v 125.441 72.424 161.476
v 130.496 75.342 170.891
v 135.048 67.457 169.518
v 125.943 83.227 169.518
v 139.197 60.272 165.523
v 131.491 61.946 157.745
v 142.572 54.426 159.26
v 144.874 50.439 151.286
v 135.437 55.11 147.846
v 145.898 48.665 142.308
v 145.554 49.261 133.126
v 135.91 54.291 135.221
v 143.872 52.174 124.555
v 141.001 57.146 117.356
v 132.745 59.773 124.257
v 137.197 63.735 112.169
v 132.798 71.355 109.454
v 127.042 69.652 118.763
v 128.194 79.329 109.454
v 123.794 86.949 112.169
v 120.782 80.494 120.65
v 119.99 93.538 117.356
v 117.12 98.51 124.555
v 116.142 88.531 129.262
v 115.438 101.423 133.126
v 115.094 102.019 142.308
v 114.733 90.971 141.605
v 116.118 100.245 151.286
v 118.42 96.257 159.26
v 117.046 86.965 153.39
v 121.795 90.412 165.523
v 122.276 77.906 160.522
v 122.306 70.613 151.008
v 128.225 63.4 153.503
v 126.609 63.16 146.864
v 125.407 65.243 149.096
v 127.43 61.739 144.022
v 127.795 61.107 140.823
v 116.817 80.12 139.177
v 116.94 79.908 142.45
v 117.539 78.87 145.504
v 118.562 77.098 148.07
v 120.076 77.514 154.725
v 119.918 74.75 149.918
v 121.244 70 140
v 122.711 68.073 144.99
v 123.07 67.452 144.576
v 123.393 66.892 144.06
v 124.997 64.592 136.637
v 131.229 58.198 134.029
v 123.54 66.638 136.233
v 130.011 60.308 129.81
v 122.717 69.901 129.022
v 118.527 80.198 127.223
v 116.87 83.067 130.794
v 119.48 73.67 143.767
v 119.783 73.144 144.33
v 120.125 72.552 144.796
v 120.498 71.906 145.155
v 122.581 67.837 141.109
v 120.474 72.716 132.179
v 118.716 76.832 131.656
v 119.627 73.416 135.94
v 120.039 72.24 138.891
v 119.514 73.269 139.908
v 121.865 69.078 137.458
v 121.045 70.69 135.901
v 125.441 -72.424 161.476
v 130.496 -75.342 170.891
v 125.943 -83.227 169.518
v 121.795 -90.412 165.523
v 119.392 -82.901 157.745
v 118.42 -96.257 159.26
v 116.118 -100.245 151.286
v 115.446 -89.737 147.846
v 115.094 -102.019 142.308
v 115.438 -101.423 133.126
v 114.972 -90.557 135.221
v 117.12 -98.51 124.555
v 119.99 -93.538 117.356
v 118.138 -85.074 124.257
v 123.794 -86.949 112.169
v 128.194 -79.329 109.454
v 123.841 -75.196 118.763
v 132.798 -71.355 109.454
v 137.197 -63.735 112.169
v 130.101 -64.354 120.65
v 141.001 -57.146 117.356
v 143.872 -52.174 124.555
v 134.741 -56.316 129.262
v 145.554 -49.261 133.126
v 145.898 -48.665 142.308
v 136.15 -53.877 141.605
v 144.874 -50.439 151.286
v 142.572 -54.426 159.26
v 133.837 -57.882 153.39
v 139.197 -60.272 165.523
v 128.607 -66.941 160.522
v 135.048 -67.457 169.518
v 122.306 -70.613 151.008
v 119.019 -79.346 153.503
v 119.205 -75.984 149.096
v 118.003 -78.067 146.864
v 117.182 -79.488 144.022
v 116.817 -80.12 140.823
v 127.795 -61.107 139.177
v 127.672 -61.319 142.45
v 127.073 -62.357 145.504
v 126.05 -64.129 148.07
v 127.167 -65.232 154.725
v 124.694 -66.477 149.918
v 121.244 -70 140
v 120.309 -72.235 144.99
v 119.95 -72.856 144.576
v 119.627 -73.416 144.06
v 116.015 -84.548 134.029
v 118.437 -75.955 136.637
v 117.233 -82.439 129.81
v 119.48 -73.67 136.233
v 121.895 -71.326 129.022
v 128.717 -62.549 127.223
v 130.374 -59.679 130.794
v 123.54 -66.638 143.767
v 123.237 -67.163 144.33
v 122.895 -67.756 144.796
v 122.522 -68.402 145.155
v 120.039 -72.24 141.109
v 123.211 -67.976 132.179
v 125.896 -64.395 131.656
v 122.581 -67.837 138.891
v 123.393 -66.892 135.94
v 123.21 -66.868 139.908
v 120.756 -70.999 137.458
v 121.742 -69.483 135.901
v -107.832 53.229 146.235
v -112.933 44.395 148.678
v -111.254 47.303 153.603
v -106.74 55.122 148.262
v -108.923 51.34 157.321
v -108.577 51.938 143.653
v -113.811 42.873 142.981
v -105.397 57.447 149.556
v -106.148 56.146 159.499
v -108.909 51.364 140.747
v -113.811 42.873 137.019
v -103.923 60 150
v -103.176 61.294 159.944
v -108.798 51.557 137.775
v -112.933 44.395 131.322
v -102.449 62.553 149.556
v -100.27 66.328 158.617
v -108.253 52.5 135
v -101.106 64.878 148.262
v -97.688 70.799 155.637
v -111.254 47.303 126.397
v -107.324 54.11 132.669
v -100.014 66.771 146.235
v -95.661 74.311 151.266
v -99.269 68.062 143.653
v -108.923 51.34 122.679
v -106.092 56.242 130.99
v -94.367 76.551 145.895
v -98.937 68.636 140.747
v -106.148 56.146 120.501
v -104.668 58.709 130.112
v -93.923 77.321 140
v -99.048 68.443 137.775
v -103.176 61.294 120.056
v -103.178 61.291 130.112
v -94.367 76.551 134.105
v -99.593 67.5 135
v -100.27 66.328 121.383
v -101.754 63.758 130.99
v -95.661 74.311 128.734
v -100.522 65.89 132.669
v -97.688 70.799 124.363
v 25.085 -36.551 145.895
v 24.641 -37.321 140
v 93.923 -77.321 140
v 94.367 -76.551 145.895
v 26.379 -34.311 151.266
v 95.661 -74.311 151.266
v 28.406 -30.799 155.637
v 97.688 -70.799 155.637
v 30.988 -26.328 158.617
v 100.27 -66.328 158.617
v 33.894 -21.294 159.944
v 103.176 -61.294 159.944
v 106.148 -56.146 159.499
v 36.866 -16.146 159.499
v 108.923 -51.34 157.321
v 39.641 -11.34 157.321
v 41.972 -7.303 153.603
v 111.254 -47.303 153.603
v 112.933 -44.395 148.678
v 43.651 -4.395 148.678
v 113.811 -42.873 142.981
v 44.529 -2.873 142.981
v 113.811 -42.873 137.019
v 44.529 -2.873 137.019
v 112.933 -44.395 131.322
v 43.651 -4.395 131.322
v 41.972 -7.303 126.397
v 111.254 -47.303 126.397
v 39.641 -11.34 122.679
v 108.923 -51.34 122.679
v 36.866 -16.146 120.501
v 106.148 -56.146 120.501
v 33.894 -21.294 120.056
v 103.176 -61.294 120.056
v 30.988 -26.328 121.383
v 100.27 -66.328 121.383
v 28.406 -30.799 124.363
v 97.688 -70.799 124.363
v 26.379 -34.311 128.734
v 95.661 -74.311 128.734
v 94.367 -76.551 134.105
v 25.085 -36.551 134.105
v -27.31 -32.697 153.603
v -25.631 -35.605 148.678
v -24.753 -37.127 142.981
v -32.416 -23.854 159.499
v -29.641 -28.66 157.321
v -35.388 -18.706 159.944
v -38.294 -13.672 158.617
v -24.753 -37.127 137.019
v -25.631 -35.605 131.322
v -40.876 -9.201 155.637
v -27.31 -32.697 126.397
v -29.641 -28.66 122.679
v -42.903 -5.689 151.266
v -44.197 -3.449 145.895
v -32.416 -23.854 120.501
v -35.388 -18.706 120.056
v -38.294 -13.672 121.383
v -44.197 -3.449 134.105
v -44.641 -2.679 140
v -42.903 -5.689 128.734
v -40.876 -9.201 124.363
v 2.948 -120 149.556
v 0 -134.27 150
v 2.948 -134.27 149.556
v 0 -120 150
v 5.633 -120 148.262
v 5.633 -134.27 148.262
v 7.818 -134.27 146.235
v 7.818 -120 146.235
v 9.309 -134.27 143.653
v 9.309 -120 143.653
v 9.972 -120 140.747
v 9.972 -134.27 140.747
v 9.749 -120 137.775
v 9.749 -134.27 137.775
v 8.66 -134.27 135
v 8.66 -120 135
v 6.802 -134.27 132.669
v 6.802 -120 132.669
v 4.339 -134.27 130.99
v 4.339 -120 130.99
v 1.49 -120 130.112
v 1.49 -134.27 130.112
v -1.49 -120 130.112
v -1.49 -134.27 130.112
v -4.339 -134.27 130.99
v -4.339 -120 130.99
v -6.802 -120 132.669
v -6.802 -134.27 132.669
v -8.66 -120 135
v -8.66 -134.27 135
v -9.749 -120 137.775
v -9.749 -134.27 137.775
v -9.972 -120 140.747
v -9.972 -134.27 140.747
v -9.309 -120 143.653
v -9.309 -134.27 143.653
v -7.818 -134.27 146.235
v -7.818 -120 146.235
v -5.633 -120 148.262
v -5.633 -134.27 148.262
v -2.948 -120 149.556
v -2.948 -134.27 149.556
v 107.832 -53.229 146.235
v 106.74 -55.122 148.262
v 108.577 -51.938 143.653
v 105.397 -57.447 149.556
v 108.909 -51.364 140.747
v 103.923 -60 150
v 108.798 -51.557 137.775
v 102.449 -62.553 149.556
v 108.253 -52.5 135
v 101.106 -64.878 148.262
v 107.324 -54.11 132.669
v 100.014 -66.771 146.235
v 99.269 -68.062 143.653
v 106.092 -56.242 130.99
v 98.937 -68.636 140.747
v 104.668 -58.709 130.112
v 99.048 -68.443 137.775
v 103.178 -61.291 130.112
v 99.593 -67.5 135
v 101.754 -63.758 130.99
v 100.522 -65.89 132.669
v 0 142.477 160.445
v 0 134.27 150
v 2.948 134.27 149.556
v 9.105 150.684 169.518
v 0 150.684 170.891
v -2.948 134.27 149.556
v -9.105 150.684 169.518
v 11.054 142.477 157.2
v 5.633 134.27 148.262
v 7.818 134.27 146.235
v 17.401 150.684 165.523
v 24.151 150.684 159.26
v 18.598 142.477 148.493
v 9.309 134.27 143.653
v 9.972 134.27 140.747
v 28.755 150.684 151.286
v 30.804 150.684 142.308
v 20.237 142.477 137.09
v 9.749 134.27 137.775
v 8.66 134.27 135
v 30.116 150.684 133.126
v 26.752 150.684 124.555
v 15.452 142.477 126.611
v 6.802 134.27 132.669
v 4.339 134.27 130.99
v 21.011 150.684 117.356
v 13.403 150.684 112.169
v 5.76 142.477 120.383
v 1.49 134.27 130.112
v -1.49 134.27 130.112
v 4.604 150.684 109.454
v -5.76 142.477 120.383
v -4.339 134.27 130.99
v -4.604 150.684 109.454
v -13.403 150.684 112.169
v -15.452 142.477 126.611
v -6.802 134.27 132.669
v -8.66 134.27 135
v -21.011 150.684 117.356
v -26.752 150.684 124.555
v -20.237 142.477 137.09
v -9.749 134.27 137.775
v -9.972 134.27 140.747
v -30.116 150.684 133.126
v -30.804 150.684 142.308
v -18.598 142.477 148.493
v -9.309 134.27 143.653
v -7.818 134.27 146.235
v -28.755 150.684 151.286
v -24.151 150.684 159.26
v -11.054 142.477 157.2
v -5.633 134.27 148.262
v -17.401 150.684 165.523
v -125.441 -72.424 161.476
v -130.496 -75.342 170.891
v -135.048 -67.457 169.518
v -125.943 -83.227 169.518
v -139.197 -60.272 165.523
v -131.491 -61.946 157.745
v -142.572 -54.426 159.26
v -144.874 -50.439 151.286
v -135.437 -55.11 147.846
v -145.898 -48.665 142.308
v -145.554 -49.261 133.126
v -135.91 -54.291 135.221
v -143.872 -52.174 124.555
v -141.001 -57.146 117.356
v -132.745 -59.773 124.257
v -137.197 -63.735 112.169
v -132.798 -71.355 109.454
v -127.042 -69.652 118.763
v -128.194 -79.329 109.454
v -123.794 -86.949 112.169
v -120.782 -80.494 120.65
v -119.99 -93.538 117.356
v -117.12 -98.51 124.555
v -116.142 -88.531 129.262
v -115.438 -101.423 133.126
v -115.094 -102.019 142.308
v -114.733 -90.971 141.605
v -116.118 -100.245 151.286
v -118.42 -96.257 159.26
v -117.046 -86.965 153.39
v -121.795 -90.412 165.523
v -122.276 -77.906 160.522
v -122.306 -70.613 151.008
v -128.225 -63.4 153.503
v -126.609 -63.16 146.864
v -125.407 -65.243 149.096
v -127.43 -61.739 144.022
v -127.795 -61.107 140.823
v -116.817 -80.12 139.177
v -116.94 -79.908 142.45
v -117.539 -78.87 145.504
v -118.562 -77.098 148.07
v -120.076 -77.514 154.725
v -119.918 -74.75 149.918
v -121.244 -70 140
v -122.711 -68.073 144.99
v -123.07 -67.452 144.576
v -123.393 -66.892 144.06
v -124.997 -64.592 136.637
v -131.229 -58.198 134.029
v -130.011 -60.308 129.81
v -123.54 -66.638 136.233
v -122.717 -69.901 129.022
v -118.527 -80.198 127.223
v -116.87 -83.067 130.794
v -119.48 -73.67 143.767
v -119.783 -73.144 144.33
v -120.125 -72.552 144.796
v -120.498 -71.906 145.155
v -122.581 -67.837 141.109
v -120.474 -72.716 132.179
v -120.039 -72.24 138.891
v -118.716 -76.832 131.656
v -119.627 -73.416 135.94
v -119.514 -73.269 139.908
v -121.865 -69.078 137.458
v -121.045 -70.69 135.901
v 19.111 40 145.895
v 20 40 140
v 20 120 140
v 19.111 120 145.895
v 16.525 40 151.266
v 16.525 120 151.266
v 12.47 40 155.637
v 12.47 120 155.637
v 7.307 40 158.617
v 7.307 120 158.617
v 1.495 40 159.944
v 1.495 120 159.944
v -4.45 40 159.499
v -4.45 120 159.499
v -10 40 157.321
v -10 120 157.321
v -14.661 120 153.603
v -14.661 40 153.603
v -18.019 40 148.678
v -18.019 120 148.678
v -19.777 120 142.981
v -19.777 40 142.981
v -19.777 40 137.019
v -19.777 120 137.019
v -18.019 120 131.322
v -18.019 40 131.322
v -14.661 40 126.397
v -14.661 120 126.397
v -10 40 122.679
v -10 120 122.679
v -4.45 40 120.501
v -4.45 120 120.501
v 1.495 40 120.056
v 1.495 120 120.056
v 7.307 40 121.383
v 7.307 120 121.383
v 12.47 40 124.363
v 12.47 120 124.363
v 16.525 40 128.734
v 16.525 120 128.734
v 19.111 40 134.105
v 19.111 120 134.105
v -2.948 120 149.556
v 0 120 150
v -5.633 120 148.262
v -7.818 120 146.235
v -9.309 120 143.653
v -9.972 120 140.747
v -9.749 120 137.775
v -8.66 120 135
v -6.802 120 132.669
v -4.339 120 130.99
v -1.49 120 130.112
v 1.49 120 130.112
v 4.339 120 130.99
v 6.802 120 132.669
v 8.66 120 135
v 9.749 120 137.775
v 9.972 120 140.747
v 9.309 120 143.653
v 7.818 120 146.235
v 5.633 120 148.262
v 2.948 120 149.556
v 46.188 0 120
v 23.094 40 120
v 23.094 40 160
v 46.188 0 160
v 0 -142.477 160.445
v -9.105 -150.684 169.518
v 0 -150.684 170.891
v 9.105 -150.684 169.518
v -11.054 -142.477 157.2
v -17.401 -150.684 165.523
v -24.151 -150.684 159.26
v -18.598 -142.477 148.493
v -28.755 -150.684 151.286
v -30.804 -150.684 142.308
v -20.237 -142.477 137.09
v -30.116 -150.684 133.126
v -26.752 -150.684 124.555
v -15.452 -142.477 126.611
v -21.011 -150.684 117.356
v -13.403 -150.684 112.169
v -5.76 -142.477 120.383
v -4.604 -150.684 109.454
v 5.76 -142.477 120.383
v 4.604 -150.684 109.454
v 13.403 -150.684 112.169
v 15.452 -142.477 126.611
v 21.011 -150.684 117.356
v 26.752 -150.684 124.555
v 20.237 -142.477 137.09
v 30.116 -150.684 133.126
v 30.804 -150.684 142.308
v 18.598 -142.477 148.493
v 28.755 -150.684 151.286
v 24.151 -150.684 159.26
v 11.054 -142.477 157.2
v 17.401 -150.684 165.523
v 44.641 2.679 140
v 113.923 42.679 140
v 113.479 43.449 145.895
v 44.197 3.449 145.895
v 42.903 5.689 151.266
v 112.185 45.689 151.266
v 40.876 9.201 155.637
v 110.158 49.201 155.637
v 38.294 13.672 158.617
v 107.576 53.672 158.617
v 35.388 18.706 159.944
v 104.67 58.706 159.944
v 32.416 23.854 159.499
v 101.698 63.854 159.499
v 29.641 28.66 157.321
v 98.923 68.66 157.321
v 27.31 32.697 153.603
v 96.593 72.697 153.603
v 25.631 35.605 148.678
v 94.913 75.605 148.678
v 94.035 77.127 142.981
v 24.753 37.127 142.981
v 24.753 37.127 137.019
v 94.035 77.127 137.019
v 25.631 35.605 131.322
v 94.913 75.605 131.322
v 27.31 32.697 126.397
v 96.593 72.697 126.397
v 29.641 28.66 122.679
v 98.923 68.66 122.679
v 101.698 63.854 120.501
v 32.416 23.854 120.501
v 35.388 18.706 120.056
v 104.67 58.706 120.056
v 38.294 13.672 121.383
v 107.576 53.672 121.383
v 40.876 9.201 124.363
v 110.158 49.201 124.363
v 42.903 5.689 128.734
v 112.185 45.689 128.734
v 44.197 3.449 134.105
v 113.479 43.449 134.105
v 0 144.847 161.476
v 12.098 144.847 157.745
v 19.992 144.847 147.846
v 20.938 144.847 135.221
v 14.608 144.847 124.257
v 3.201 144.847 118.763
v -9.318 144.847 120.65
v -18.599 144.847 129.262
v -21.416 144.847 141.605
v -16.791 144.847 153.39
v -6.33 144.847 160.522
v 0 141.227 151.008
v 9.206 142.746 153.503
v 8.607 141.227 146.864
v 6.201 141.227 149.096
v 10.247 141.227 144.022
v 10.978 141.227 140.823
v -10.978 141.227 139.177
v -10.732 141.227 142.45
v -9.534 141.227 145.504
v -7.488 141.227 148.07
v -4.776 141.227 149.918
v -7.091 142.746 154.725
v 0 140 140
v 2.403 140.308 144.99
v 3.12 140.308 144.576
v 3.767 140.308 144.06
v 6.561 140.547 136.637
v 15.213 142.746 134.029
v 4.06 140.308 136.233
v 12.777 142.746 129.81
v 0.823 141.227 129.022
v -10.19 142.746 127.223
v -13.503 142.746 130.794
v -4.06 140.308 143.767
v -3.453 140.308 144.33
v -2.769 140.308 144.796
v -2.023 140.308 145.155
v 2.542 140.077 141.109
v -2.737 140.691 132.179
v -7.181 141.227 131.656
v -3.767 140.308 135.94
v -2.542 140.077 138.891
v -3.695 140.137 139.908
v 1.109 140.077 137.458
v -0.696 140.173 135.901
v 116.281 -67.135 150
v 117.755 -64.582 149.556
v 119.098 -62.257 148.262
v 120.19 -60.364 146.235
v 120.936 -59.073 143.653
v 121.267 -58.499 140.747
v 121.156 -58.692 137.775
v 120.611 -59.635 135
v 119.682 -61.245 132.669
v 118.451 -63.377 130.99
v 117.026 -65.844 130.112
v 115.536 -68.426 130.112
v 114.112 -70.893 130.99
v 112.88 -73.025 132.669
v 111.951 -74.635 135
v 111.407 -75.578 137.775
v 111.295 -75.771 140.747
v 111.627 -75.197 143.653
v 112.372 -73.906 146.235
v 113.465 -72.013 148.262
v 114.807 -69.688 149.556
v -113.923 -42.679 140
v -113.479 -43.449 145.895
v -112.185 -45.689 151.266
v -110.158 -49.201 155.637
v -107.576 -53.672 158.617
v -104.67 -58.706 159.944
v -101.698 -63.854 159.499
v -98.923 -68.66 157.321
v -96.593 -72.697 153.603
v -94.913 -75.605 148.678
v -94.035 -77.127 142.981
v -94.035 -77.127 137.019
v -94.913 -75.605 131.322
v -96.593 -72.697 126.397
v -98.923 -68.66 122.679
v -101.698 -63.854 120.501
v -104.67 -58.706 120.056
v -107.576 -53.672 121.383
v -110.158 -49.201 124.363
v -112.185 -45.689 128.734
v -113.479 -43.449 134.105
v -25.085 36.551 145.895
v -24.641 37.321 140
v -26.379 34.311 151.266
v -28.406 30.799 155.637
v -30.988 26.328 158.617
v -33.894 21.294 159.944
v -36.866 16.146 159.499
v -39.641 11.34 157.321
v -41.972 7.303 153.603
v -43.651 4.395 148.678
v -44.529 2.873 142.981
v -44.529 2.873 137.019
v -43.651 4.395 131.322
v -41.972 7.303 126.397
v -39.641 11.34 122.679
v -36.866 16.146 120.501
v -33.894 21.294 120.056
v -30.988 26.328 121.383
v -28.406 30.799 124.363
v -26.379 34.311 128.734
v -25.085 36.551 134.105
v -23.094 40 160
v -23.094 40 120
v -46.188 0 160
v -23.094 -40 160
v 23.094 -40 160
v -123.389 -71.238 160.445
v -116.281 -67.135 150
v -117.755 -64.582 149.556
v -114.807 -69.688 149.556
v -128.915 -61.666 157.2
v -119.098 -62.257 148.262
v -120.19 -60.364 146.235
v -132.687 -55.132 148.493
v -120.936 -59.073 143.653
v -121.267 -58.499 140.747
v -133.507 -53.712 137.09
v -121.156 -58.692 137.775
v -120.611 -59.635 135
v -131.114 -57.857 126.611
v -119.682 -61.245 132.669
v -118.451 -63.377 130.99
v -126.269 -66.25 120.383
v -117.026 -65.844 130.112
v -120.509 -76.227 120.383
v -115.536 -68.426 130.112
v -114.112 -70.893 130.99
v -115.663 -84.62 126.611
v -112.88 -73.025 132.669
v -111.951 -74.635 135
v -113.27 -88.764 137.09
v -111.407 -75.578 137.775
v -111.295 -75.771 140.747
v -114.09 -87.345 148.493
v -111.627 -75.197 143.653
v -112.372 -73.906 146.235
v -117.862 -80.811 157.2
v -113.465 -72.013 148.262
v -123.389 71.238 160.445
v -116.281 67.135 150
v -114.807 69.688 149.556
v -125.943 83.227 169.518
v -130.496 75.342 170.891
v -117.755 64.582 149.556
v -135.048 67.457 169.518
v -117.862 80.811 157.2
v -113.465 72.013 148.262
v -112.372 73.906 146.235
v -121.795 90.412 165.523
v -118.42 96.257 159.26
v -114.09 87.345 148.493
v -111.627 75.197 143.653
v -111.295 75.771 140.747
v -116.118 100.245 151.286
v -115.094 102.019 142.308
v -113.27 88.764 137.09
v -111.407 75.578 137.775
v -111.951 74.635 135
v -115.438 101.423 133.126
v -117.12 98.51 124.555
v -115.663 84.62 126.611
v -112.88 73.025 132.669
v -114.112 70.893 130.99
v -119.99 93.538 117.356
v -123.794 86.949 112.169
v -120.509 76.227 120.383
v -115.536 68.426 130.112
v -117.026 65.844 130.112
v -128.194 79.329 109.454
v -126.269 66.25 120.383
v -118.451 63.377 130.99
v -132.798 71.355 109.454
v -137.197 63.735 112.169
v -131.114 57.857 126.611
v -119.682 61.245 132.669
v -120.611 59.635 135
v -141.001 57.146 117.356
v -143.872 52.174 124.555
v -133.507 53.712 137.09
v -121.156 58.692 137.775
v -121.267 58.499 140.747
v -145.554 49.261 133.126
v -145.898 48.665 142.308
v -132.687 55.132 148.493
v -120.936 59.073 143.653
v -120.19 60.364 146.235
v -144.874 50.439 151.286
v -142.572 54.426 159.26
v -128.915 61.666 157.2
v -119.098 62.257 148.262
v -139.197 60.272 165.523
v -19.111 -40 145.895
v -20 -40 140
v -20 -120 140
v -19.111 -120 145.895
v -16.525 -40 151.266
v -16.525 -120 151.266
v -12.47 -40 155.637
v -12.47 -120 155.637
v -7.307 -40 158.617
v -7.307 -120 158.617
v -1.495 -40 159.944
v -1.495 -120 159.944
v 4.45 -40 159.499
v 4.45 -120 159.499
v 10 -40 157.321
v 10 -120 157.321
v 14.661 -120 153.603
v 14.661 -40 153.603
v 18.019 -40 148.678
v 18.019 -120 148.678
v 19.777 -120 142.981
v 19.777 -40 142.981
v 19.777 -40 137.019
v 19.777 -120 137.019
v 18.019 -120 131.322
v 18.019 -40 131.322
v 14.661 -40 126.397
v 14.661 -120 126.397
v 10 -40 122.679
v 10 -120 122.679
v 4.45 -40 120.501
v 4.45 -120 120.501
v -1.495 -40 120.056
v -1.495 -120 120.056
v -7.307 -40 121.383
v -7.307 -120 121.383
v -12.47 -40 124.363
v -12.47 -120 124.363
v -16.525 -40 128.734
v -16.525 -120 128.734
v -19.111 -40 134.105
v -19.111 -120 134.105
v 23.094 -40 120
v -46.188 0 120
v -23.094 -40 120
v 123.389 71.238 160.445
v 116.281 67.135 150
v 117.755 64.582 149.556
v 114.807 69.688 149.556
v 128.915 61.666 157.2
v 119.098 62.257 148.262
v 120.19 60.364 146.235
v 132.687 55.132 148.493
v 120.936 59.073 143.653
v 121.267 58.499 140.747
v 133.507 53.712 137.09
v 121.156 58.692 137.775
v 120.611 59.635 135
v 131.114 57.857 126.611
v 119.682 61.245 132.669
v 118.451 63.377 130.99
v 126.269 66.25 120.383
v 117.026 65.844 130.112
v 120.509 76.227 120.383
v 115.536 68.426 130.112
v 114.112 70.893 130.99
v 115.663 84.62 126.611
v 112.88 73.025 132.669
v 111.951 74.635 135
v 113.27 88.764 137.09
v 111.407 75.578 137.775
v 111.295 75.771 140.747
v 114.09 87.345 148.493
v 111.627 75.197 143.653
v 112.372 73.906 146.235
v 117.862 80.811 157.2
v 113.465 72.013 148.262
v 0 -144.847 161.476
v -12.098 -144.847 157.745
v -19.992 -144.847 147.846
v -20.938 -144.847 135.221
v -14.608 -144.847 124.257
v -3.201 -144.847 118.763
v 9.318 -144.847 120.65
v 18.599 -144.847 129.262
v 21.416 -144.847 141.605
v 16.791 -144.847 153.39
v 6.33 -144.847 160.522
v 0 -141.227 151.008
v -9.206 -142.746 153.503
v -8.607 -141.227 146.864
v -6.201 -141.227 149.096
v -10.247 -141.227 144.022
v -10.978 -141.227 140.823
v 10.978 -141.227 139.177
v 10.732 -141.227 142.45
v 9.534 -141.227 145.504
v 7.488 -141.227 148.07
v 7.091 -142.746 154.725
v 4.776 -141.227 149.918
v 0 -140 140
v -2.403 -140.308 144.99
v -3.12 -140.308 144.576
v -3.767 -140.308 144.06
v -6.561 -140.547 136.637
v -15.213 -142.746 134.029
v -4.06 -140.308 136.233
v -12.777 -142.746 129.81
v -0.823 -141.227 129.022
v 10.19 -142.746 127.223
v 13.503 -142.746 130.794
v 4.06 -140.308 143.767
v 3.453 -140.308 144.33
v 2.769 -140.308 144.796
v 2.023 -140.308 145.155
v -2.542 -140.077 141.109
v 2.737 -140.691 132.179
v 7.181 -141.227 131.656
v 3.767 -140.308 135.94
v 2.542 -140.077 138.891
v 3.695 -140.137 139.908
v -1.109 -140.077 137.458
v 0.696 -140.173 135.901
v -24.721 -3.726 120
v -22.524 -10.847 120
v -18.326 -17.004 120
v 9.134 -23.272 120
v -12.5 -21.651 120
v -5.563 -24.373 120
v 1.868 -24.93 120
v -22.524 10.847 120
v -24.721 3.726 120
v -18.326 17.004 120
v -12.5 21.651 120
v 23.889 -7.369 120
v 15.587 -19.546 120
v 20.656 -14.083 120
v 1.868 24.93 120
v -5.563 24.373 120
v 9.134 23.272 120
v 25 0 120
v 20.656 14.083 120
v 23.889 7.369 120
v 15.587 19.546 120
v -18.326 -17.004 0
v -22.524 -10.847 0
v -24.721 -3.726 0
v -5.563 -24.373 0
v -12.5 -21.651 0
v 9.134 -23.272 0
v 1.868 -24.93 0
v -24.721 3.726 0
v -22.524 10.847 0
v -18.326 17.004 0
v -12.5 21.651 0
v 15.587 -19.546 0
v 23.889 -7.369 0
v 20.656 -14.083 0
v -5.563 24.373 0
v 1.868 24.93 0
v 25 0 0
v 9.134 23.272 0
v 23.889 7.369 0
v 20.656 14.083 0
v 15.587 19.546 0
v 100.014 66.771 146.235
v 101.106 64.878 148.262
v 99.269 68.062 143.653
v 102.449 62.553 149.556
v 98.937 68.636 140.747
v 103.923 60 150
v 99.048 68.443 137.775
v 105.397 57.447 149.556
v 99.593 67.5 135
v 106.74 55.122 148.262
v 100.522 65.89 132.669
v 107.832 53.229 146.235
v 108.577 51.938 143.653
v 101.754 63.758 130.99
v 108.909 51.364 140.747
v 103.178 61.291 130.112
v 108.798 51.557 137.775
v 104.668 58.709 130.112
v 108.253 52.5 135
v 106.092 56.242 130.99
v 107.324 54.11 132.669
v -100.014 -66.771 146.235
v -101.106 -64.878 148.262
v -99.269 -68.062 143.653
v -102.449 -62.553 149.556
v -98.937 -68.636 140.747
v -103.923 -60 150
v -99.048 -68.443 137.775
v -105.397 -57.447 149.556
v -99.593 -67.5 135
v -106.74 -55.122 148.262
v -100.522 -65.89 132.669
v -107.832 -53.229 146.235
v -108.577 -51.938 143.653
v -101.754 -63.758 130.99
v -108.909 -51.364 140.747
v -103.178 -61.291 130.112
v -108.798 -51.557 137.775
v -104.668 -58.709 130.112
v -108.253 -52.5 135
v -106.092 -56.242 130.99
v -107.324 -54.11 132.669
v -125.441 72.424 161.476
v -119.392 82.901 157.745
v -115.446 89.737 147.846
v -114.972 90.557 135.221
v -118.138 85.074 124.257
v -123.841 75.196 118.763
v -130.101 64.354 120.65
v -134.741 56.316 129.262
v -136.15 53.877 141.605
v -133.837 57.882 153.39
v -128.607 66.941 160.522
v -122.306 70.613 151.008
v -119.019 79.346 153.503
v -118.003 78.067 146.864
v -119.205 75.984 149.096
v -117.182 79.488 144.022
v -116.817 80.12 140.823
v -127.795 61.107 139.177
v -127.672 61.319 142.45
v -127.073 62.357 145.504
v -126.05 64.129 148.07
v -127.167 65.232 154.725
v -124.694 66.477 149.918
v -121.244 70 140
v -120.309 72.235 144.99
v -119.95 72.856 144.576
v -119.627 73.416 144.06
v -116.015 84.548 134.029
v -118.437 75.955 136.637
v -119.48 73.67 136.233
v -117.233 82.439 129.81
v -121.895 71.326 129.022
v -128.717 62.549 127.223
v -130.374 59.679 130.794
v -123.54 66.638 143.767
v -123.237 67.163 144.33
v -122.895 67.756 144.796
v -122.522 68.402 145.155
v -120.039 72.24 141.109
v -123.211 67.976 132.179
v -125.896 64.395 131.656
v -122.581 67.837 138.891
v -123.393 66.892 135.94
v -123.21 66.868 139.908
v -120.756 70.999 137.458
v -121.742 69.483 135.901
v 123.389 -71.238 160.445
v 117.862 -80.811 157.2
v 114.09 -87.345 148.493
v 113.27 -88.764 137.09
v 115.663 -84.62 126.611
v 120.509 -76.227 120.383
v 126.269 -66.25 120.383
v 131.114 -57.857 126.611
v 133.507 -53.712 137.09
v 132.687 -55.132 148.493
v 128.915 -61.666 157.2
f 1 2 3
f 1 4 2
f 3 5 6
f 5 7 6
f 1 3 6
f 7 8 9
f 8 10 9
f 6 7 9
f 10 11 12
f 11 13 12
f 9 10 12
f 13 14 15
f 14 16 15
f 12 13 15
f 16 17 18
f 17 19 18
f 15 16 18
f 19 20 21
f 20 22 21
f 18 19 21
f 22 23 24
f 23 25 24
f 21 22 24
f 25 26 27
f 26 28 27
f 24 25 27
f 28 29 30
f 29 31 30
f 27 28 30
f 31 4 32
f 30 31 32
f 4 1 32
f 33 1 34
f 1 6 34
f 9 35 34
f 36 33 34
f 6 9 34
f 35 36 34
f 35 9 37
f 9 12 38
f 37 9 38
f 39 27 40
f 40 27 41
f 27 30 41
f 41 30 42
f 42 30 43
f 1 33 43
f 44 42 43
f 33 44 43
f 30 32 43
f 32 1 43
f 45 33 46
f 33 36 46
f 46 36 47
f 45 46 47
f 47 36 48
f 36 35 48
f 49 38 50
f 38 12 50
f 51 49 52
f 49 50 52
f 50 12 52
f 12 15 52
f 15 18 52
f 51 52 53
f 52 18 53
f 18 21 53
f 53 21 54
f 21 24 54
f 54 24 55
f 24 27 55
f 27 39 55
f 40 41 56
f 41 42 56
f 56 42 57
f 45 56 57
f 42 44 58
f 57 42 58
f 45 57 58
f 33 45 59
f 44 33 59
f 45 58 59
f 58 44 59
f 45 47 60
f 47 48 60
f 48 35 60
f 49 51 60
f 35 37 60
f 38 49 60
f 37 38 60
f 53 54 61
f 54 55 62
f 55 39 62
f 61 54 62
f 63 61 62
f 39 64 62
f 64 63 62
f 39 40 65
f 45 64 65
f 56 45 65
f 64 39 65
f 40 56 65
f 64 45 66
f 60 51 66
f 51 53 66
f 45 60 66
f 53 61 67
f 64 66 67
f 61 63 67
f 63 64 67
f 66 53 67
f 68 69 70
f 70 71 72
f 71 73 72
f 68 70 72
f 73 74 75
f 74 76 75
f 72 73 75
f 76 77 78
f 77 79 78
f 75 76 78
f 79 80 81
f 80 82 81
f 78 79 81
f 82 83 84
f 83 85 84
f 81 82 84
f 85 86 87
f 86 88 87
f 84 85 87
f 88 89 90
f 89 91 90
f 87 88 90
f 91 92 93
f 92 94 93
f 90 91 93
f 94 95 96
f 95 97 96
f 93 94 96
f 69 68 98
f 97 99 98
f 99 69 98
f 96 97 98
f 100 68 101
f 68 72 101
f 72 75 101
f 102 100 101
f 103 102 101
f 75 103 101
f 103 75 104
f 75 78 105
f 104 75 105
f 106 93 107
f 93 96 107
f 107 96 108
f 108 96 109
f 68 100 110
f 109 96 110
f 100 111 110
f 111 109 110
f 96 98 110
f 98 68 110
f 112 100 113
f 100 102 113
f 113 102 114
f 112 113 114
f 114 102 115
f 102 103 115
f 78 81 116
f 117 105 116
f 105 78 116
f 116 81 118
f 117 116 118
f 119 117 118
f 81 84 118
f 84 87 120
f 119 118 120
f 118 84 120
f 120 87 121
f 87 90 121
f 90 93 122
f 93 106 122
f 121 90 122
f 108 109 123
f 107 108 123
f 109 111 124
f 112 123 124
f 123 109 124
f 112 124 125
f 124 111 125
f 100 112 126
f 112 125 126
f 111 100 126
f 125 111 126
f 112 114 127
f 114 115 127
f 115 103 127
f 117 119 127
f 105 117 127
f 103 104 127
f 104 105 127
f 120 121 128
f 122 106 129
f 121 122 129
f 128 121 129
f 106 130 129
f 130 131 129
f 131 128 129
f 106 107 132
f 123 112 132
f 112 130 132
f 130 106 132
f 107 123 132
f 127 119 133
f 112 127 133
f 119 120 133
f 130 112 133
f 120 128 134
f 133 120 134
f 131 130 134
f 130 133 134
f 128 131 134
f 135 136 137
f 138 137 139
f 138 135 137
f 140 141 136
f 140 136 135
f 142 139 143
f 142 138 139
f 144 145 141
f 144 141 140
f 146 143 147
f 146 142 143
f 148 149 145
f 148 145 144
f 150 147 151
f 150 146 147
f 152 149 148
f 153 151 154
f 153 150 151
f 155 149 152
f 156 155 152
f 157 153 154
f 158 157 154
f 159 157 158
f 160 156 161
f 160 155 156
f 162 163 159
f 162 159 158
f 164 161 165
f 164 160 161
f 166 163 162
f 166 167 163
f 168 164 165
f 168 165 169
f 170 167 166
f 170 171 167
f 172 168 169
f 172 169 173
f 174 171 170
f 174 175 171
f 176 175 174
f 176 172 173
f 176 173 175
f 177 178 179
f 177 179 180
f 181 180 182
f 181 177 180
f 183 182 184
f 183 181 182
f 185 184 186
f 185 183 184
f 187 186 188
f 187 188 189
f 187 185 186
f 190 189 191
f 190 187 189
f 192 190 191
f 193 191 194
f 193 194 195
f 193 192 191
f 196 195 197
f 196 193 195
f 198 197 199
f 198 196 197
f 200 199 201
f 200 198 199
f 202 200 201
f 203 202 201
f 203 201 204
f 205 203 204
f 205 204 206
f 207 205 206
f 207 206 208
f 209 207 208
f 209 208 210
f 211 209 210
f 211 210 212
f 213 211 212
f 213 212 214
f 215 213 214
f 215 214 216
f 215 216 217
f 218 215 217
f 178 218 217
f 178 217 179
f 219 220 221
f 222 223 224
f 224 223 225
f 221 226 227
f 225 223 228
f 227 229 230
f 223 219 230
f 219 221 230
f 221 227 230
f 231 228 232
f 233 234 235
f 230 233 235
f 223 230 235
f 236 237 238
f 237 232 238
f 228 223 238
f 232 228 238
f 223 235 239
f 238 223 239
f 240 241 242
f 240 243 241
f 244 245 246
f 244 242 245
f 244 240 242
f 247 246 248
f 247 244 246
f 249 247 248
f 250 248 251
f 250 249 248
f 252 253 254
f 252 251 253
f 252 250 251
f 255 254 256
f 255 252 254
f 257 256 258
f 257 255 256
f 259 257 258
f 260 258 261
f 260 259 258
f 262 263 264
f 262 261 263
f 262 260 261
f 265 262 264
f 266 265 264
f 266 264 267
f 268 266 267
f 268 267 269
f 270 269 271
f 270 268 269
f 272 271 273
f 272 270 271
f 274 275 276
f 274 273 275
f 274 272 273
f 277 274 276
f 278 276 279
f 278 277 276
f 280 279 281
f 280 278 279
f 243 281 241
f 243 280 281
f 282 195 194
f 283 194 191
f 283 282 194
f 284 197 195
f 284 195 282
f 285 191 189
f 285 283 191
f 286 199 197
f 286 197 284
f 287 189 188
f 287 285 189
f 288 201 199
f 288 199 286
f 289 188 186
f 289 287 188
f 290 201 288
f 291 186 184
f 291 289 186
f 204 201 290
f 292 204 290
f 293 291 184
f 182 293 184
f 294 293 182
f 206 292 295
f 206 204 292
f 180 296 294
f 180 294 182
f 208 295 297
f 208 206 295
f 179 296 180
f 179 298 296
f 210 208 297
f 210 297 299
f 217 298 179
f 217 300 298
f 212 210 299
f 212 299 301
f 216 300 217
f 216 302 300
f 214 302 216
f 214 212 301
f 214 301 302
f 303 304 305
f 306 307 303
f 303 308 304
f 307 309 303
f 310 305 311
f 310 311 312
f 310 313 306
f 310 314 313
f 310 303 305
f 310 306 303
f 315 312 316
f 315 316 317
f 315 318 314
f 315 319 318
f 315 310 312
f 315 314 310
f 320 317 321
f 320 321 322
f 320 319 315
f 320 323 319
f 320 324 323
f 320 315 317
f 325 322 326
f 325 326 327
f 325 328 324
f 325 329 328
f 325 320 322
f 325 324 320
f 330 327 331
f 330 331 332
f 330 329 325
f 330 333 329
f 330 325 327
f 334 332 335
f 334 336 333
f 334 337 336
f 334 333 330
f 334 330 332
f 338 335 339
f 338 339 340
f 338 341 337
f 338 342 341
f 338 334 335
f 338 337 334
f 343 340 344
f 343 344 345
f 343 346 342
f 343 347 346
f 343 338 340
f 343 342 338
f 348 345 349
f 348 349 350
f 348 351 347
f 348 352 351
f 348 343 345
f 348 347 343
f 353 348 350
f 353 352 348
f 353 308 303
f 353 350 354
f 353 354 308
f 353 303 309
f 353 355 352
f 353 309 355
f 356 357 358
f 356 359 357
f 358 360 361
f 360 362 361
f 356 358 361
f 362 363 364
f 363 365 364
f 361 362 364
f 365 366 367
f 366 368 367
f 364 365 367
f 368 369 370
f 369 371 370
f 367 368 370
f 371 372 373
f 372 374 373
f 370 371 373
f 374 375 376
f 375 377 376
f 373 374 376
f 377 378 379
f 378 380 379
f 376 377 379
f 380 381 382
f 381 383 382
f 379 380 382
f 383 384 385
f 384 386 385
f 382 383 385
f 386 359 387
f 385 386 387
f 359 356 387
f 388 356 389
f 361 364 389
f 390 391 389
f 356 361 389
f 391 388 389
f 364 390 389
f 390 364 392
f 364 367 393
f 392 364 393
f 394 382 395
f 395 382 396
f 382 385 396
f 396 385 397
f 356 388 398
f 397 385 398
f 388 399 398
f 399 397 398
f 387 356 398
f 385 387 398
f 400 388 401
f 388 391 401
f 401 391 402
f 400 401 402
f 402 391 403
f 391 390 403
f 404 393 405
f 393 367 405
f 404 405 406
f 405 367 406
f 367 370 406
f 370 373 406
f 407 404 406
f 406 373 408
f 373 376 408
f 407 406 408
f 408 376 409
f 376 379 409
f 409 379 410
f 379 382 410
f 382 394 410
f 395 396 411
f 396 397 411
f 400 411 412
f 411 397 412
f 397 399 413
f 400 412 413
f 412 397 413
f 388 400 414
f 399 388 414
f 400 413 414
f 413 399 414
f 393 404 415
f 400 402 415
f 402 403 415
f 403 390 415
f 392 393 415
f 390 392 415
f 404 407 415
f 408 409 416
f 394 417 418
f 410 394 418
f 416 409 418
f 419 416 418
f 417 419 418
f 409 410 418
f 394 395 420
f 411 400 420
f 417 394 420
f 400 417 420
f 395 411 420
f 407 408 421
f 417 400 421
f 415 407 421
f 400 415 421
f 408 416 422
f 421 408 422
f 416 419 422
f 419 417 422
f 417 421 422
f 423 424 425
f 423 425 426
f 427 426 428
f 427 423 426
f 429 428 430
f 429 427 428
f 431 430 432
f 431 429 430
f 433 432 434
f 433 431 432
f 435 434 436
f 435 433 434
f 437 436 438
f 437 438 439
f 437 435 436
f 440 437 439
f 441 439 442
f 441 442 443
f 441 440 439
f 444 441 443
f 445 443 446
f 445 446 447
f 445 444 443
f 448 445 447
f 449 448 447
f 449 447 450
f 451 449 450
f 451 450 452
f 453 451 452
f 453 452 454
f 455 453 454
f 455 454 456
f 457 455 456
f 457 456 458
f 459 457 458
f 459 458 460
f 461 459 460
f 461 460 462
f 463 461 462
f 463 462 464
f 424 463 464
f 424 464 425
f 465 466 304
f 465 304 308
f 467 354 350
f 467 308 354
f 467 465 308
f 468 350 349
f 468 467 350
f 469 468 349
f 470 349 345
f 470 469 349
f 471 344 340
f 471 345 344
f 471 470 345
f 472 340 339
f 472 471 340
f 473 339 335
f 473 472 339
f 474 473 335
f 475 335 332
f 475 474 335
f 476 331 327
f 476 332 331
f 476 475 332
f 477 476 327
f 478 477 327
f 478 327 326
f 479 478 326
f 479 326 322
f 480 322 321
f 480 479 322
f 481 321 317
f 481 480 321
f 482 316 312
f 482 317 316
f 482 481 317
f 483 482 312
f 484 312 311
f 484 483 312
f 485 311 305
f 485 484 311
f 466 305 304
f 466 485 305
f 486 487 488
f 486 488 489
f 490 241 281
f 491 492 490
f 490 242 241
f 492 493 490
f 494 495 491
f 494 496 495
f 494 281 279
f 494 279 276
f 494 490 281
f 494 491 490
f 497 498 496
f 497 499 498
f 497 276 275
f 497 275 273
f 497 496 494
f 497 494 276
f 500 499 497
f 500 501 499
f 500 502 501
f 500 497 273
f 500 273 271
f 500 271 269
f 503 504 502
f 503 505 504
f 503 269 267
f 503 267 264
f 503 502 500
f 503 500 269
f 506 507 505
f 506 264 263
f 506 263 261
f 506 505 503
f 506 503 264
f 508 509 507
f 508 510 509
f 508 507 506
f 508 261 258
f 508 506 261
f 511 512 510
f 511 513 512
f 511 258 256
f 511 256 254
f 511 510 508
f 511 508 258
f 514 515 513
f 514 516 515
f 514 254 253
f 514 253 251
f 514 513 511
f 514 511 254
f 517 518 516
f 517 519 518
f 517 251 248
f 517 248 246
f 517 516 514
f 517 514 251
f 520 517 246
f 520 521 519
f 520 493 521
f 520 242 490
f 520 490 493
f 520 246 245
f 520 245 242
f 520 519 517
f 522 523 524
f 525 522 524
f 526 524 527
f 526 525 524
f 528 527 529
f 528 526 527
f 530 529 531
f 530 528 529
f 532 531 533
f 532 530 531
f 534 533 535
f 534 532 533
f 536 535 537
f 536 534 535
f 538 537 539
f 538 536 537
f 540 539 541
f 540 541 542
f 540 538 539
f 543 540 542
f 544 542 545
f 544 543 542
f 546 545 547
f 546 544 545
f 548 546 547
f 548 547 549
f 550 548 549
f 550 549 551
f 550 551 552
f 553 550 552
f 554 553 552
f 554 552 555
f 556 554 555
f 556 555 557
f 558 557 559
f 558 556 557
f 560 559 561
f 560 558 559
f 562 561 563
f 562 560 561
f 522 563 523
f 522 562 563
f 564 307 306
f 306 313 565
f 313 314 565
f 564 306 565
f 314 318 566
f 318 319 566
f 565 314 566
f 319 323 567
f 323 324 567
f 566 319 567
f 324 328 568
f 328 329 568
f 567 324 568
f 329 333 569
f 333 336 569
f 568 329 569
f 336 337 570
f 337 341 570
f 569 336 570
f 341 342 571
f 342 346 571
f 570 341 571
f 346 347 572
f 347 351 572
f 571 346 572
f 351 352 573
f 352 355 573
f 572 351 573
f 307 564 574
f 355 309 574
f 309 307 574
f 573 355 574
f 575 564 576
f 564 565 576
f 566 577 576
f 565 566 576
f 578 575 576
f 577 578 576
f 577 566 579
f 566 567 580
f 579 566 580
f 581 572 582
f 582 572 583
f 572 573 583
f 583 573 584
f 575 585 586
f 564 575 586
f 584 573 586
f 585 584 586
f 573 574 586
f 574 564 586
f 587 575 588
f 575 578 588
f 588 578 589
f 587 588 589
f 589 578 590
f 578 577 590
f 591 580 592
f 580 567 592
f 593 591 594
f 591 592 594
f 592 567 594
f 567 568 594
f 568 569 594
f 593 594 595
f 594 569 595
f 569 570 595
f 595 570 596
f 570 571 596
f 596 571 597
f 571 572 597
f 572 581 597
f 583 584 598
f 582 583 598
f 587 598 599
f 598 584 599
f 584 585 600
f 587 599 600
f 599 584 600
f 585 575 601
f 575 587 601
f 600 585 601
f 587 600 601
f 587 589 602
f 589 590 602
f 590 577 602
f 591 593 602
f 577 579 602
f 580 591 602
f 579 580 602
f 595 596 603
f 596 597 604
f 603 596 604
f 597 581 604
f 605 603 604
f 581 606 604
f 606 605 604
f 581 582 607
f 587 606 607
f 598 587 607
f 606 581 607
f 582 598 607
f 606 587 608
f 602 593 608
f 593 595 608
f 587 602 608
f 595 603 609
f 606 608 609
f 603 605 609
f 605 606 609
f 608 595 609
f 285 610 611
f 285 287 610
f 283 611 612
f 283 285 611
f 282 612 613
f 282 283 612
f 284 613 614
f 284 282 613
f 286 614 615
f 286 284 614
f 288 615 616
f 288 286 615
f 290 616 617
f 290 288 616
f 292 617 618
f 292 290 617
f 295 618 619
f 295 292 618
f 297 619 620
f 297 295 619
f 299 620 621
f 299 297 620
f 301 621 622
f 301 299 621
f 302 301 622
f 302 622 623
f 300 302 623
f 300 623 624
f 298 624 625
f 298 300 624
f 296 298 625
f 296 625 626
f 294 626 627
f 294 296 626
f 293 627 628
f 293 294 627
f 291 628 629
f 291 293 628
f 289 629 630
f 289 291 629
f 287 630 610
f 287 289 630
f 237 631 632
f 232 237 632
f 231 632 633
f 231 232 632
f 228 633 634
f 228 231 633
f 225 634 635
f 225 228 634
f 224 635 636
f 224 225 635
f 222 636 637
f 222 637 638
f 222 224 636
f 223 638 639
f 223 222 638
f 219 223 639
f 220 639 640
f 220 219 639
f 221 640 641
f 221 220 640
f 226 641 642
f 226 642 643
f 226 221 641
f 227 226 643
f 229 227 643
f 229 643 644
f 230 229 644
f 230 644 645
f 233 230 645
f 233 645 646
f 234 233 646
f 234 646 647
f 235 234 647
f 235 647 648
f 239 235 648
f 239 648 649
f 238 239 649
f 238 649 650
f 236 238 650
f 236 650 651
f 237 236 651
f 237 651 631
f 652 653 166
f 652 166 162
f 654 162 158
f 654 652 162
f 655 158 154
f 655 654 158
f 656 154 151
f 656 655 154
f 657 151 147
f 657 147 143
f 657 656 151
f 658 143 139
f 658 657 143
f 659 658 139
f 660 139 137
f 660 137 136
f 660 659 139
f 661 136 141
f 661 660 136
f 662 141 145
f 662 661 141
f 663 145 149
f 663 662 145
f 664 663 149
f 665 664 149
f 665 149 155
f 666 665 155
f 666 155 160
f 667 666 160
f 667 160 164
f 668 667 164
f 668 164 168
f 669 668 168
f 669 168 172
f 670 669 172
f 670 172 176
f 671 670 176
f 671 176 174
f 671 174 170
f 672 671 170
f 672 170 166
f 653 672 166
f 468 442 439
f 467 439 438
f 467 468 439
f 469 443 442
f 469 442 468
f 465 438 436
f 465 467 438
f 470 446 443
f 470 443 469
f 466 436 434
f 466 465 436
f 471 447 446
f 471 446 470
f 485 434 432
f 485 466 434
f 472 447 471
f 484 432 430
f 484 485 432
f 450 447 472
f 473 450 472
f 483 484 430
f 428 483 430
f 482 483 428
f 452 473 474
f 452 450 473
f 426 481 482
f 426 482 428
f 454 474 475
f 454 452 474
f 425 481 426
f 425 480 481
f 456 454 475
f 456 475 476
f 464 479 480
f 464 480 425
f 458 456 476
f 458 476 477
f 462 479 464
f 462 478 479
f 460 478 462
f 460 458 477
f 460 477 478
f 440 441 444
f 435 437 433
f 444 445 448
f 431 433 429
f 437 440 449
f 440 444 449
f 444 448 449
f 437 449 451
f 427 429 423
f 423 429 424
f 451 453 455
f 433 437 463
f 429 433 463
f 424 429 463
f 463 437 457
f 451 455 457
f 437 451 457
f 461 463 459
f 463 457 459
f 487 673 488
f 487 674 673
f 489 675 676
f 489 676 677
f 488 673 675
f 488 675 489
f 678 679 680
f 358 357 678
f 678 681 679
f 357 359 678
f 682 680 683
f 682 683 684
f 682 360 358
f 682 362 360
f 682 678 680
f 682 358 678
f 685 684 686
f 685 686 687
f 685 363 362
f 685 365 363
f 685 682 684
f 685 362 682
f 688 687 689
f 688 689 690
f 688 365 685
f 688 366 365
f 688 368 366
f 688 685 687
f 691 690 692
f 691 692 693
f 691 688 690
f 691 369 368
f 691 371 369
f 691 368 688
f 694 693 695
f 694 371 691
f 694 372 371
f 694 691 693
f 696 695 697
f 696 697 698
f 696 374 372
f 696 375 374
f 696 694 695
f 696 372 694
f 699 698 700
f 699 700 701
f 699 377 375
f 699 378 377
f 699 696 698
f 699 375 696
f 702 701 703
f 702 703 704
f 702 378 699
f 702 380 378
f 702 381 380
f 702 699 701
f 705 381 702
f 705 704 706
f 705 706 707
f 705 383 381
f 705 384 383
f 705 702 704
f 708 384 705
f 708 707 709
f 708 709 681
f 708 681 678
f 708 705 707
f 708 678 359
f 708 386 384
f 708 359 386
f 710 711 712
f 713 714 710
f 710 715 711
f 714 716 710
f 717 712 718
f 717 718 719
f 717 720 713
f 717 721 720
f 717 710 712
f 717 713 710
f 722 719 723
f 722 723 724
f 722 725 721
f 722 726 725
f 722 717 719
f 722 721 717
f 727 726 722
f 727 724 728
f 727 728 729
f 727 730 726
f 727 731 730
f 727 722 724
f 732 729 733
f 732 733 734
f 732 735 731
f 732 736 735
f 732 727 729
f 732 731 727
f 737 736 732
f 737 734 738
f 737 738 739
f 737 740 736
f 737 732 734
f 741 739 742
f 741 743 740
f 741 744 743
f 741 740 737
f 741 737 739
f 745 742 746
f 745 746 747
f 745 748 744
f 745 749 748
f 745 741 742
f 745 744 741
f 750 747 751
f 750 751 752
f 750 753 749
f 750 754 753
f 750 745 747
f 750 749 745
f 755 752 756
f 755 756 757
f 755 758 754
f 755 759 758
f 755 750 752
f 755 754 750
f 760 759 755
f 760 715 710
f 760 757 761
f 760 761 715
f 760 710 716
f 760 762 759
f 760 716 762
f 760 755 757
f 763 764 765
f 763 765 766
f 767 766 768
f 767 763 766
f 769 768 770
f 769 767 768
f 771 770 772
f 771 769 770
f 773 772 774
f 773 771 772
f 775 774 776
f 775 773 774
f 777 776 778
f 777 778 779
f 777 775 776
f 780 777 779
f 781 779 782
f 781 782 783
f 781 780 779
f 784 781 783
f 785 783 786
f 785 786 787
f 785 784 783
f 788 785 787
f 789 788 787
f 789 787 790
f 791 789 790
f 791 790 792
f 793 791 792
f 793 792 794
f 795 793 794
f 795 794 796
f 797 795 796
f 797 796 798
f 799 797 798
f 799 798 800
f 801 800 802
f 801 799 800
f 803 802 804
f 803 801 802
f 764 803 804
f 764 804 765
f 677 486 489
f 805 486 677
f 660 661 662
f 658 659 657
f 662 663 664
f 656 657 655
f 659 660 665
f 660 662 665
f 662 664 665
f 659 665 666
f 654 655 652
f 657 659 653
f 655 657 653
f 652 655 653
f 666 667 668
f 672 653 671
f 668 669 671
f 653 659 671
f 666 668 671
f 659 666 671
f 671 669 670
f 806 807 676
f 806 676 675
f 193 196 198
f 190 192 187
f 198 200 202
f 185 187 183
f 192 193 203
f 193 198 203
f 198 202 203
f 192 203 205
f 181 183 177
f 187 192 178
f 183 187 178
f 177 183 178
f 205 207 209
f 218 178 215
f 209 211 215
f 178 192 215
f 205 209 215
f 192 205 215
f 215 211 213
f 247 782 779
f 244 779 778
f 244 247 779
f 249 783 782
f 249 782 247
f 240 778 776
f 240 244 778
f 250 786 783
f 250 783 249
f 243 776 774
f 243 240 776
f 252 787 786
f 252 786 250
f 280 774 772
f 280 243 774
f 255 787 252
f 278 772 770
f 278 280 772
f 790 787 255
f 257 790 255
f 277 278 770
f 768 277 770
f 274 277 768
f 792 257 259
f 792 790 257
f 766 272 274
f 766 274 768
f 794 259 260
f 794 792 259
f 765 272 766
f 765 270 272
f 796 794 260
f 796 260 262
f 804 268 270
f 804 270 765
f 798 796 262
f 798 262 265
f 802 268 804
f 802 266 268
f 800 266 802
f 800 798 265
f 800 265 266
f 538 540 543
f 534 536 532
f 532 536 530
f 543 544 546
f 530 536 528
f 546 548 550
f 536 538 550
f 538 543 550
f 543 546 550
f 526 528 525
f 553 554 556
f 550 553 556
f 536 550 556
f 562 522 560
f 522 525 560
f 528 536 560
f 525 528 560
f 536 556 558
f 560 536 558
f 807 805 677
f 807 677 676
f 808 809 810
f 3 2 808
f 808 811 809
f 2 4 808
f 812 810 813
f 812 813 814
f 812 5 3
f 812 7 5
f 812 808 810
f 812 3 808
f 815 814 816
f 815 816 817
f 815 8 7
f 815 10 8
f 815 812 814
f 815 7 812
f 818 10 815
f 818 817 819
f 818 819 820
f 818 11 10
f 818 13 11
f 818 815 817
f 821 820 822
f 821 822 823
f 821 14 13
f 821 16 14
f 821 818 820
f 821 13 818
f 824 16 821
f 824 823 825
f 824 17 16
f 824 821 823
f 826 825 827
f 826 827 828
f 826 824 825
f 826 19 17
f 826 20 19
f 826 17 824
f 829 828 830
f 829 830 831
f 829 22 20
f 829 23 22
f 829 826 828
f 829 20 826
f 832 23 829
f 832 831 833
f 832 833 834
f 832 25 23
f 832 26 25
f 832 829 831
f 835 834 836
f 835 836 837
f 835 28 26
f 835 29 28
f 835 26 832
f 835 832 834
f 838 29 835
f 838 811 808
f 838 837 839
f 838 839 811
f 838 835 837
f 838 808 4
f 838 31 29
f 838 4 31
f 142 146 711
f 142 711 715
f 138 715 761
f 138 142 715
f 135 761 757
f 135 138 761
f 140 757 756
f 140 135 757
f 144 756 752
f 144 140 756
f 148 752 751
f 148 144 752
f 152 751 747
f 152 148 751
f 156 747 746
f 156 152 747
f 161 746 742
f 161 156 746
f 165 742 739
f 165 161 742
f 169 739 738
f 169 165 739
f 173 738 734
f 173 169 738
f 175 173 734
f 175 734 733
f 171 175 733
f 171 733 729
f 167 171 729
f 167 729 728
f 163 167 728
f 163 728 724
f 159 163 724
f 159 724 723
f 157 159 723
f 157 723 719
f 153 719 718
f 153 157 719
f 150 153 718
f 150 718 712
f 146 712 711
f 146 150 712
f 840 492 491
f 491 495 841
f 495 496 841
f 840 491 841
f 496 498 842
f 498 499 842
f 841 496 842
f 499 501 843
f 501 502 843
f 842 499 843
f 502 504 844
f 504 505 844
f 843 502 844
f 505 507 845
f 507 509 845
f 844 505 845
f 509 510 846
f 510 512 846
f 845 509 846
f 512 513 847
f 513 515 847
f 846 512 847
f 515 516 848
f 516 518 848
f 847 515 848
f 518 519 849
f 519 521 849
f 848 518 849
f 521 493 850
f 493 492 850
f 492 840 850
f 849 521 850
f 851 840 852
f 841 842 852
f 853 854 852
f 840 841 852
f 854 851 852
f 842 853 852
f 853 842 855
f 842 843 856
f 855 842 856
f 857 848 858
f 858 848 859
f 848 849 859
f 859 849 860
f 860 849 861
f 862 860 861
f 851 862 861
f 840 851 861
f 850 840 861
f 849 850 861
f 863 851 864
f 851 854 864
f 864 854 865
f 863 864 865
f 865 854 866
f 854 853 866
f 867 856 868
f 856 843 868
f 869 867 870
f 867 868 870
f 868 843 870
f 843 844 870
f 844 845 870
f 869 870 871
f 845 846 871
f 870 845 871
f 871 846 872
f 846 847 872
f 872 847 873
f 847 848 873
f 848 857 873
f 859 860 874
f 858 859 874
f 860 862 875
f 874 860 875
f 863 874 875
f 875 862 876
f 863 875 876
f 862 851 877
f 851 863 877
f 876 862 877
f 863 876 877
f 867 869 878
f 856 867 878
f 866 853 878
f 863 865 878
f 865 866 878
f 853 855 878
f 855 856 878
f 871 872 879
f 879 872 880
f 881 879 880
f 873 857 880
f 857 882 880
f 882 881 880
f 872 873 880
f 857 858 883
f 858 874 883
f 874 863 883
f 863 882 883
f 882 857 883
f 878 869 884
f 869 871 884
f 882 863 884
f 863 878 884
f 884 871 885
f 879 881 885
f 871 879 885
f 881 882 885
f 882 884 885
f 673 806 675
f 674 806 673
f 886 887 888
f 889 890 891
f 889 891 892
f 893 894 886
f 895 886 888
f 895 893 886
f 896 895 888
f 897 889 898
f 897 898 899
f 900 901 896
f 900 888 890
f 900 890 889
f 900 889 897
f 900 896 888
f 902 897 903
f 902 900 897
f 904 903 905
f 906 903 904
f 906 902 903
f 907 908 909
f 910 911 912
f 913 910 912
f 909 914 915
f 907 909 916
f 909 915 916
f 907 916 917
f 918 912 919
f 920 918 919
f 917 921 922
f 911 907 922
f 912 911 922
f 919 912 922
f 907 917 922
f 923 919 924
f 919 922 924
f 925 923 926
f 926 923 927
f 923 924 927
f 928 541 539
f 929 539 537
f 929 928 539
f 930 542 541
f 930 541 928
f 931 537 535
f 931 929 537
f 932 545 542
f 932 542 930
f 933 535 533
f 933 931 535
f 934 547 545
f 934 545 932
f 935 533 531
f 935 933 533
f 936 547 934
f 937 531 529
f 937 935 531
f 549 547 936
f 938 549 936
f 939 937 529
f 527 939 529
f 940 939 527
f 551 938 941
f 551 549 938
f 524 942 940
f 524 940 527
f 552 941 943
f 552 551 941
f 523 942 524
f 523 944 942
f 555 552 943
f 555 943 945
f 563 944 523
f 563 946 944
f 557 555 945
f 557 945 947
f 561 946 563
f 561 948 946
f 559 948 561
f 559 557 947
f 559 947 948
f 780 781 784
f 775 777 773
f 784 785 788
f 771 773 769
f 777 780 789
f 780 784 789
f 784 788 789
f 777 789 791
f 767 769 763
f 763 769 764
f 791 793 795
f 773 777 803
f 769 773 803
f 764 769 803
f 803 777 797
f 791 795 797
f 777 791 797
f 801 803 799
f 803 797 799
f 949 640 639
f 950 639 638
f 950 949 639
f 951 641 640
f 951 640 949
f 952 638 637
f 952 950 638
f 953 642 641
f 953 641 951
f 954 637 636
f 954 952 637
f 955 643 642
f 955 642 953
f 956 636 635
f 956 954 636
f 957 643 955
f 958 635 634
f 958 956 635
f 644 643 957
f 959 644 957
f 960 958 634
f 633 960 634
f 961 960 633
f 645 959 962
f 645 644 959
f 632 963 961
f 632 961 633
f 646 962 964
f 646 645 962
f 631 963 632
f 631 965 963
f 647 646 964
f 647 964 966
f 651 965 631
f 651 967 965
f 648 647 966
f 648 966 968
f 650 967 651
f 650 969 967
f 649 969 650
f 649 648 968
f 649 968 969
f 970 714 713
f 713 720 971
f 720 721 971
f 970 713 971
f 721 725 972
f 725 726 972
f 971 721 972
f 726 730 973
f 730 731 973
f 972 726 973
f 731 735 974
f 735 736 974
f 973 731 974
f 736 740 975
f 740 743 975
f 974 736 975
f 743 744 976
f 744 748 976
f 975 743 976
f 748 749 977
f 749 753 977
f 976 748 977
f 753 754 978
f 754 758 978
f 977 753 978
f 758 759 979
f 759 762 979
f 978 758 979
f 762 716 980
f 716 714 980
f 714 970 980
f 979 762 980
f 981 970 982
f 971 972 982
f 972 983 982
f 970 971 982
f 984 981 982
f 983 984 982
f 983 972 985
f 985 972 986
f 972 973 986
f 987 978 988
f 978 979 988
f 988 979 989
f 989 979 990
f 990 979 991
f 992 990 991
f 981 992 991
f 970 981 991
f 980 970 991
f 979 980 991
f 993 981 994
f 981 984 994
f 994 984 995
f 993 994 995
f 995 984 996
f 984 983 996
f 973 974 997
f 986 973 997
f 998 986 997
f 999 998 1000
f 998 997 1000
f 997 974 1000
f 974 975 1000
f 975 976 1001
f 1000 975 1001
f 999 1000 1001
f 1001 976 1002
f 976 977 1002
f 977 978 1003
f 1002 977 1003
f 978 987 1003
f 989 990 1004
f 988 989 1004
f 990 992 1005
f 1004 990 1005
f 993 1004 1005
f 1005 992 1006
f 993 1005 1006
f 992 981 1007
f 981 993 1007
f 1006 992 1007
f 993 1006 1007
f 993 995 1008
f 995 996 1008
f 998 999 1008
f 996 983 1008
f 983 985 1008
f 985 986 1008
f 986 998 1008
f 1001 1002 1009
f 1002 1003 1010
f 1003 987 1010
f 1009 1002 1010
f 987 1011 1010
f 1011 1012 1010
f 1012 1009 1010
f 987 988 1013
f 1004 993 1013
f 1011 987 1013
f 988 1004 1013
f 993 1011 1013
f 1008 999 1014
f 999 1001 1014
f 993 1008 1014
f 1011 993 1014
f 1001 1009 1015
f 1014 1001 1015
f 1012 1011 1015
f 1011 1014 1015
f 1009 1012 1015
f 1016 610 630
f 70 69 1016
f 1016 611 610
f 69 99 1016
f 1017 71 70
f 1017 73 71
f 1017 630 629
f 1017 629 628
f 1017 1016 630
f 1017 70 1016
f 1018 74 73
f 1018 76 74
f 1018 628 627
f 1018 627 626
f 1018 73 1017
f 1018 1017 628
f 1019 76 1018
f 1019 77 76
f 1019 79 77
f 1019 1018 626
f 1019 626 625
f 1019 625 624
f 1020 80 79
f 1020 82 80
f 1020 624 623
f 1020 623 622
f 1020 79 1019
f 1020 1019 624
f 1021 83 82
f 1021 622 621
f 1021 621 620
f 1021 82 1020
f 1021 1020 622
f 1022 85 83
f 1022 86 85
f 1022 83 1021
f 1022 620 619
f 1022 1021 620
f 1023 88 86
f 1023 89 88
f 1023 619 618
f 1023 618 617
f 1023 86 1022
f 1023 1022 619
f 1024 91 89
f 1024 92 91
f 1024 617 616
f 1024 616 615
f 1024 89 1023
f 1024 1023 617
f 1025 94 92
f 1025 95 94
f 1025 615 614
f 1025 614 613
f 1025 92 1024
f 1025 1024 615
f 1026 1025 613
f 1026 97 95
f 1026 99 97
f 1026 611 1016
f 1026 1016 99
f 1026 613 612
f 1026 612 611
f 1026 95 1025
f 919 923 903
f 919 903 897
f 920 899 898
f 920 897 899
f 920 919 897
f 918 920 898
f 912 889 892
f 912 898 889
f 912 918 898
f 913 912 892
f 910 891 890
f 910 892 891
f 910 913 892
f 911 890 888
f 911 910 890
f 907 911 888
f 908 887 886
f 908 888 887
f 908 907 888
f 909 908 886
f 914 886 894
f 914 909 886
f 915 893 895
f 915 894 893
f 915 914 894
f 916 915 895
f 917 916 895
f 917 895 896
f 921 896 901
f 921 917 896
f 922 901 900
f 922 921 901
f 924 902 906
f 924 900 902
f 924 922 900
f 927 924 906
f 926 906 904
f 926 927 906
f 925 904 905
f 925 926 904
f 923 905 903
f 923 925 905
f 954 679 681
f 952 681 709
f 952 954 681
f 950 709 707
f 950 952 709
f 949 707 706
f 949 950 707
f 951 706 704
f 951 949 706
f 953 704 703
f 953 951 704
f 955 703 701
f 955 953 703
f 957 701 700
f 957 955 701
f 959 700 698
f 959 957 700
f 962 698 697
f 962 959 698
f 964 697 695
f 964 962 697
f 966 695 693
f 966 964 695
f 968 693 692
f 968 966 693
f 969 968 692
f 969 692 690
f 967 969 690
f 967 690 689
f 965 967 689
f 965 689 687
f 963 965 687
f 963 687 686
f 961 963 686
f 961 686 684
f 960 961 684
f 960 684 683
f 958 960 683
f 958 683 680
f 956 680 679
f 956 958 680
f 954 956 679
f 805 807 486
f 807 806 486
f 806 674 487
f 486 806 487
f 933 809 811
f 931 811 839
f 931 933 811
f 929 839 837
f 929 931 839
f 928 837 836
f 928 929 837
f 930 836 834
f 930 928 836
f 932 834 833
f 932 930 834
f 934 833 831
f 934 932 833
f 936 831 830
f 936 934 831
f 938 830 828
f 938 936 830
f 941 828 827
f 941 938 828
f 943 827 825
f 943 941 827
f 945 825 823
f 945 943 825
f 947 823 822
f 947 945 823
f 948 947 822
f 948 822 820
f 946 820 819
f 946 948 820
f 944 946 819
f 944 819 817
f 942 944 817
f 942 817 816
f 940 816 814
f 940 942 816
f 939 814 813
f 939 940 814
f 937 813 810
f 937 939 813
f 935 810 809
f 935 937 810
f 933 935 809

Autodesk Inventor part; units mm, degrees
sketch "Sketch1" plane through (0, 0, 0) normal (0, 0, 1) x (1, 0, 0)
  circle A0 centre (0, 0) radius 25
  dimension "d0" = 50
extrude "Extrusion1" add sketch "Sketch1" along normal blind 120
sketch "Sketch2" plane through (0, 0, 120) normal (0, 0, 1) x (1, 0, 0)
  line L0 (46.188, 0) -> (23.094, -40)
  line L1 (23.094, -40) -> (-23.094, -40)
  line L2 (-23.094, -40) -> (-46.188, 0)
  line L3 (-46.188, 0) -> (-23.094, 40)
  line L4 (-23.094, 40) -> (23.094, 40)
  line L5 (23.094, 40) -> (46.188, 0)
  point P0 (0, 0)
  point P1 (0, 0)
  dimension "d4" = 40
extrude "Extrusion2" add sketch "Sketch2" along normal blind 40 separate body
sketch "Sketch3" plane through (-23.094, 40, 120) normal (0, 1, 0) x (1, 0, 0)
  line L0 (0, 0) -> (0, -40) projected
  line L1 (0, -20) -> (46.188, -20)
  line L2 (46.188, 0) -> (46.188, -40) projected
  circle A0 centre (23.094, -20) radius 20
  point P0 (23.094, 120)
extrude "Extrusion3" add sketch "Sketch3" along normal blind 80 separate body
ref_plane "Work Plane1" through (0, 40, 140) normal (-1, 0, 0) x (0, 1, 0)
sketch "Sketch4" plane through (0, 40, 140) normal (-1, 0, 0) x (0, 1, 0)
  arc A0 (100, 0) -> (110.6837, -30.8906) centre (150, 0) ccw
  line L0 (0, 20) -> (0, -20) projected
  line L1 (150, 0) -> (0, 0)
  line L2 (110.6837, -30.8906) -> (94.27, -10)
  line L3 (94.27, -10) -> (80, -10)
  line L4 (80, -20) -> (80, 20) projected
  line L5 (100, 0) -> (80, 0)
  line L6 (80, 0) -> (80, -10)
  line L7 (-126, 0) -> (196, 0) projected
  point P0 (-40, 140)
  point P1 (100.0097, -0.9845)
  dimension "d11" = 150
  dimension "d12" = 10
revolve "Revolution1" add sketch "Sketch4" angle 360 about axis through (0, 40, 140) along (0, 1, 0) bodies 3
pattern_circular "Circular Pattern1" count 6 over 360 about axis through (0, 0, 0) along (0, 0, 1) bodies 3
ref_plane "Work Plane2" through (0, 0, 0) normal (0.866, 0.5, 0) x (0, 0, 1)
ref_plane "Work Plane3" through (0, 0, 0) normal (-0.5, -0.866, 0) x (0, 0, 1)
ref_plane "Work Plane4" through (-23.094, -40, 120) normal (-0.866, 0.5, 0) x (0, 0, 1)
properties part number "六針夾爪"
